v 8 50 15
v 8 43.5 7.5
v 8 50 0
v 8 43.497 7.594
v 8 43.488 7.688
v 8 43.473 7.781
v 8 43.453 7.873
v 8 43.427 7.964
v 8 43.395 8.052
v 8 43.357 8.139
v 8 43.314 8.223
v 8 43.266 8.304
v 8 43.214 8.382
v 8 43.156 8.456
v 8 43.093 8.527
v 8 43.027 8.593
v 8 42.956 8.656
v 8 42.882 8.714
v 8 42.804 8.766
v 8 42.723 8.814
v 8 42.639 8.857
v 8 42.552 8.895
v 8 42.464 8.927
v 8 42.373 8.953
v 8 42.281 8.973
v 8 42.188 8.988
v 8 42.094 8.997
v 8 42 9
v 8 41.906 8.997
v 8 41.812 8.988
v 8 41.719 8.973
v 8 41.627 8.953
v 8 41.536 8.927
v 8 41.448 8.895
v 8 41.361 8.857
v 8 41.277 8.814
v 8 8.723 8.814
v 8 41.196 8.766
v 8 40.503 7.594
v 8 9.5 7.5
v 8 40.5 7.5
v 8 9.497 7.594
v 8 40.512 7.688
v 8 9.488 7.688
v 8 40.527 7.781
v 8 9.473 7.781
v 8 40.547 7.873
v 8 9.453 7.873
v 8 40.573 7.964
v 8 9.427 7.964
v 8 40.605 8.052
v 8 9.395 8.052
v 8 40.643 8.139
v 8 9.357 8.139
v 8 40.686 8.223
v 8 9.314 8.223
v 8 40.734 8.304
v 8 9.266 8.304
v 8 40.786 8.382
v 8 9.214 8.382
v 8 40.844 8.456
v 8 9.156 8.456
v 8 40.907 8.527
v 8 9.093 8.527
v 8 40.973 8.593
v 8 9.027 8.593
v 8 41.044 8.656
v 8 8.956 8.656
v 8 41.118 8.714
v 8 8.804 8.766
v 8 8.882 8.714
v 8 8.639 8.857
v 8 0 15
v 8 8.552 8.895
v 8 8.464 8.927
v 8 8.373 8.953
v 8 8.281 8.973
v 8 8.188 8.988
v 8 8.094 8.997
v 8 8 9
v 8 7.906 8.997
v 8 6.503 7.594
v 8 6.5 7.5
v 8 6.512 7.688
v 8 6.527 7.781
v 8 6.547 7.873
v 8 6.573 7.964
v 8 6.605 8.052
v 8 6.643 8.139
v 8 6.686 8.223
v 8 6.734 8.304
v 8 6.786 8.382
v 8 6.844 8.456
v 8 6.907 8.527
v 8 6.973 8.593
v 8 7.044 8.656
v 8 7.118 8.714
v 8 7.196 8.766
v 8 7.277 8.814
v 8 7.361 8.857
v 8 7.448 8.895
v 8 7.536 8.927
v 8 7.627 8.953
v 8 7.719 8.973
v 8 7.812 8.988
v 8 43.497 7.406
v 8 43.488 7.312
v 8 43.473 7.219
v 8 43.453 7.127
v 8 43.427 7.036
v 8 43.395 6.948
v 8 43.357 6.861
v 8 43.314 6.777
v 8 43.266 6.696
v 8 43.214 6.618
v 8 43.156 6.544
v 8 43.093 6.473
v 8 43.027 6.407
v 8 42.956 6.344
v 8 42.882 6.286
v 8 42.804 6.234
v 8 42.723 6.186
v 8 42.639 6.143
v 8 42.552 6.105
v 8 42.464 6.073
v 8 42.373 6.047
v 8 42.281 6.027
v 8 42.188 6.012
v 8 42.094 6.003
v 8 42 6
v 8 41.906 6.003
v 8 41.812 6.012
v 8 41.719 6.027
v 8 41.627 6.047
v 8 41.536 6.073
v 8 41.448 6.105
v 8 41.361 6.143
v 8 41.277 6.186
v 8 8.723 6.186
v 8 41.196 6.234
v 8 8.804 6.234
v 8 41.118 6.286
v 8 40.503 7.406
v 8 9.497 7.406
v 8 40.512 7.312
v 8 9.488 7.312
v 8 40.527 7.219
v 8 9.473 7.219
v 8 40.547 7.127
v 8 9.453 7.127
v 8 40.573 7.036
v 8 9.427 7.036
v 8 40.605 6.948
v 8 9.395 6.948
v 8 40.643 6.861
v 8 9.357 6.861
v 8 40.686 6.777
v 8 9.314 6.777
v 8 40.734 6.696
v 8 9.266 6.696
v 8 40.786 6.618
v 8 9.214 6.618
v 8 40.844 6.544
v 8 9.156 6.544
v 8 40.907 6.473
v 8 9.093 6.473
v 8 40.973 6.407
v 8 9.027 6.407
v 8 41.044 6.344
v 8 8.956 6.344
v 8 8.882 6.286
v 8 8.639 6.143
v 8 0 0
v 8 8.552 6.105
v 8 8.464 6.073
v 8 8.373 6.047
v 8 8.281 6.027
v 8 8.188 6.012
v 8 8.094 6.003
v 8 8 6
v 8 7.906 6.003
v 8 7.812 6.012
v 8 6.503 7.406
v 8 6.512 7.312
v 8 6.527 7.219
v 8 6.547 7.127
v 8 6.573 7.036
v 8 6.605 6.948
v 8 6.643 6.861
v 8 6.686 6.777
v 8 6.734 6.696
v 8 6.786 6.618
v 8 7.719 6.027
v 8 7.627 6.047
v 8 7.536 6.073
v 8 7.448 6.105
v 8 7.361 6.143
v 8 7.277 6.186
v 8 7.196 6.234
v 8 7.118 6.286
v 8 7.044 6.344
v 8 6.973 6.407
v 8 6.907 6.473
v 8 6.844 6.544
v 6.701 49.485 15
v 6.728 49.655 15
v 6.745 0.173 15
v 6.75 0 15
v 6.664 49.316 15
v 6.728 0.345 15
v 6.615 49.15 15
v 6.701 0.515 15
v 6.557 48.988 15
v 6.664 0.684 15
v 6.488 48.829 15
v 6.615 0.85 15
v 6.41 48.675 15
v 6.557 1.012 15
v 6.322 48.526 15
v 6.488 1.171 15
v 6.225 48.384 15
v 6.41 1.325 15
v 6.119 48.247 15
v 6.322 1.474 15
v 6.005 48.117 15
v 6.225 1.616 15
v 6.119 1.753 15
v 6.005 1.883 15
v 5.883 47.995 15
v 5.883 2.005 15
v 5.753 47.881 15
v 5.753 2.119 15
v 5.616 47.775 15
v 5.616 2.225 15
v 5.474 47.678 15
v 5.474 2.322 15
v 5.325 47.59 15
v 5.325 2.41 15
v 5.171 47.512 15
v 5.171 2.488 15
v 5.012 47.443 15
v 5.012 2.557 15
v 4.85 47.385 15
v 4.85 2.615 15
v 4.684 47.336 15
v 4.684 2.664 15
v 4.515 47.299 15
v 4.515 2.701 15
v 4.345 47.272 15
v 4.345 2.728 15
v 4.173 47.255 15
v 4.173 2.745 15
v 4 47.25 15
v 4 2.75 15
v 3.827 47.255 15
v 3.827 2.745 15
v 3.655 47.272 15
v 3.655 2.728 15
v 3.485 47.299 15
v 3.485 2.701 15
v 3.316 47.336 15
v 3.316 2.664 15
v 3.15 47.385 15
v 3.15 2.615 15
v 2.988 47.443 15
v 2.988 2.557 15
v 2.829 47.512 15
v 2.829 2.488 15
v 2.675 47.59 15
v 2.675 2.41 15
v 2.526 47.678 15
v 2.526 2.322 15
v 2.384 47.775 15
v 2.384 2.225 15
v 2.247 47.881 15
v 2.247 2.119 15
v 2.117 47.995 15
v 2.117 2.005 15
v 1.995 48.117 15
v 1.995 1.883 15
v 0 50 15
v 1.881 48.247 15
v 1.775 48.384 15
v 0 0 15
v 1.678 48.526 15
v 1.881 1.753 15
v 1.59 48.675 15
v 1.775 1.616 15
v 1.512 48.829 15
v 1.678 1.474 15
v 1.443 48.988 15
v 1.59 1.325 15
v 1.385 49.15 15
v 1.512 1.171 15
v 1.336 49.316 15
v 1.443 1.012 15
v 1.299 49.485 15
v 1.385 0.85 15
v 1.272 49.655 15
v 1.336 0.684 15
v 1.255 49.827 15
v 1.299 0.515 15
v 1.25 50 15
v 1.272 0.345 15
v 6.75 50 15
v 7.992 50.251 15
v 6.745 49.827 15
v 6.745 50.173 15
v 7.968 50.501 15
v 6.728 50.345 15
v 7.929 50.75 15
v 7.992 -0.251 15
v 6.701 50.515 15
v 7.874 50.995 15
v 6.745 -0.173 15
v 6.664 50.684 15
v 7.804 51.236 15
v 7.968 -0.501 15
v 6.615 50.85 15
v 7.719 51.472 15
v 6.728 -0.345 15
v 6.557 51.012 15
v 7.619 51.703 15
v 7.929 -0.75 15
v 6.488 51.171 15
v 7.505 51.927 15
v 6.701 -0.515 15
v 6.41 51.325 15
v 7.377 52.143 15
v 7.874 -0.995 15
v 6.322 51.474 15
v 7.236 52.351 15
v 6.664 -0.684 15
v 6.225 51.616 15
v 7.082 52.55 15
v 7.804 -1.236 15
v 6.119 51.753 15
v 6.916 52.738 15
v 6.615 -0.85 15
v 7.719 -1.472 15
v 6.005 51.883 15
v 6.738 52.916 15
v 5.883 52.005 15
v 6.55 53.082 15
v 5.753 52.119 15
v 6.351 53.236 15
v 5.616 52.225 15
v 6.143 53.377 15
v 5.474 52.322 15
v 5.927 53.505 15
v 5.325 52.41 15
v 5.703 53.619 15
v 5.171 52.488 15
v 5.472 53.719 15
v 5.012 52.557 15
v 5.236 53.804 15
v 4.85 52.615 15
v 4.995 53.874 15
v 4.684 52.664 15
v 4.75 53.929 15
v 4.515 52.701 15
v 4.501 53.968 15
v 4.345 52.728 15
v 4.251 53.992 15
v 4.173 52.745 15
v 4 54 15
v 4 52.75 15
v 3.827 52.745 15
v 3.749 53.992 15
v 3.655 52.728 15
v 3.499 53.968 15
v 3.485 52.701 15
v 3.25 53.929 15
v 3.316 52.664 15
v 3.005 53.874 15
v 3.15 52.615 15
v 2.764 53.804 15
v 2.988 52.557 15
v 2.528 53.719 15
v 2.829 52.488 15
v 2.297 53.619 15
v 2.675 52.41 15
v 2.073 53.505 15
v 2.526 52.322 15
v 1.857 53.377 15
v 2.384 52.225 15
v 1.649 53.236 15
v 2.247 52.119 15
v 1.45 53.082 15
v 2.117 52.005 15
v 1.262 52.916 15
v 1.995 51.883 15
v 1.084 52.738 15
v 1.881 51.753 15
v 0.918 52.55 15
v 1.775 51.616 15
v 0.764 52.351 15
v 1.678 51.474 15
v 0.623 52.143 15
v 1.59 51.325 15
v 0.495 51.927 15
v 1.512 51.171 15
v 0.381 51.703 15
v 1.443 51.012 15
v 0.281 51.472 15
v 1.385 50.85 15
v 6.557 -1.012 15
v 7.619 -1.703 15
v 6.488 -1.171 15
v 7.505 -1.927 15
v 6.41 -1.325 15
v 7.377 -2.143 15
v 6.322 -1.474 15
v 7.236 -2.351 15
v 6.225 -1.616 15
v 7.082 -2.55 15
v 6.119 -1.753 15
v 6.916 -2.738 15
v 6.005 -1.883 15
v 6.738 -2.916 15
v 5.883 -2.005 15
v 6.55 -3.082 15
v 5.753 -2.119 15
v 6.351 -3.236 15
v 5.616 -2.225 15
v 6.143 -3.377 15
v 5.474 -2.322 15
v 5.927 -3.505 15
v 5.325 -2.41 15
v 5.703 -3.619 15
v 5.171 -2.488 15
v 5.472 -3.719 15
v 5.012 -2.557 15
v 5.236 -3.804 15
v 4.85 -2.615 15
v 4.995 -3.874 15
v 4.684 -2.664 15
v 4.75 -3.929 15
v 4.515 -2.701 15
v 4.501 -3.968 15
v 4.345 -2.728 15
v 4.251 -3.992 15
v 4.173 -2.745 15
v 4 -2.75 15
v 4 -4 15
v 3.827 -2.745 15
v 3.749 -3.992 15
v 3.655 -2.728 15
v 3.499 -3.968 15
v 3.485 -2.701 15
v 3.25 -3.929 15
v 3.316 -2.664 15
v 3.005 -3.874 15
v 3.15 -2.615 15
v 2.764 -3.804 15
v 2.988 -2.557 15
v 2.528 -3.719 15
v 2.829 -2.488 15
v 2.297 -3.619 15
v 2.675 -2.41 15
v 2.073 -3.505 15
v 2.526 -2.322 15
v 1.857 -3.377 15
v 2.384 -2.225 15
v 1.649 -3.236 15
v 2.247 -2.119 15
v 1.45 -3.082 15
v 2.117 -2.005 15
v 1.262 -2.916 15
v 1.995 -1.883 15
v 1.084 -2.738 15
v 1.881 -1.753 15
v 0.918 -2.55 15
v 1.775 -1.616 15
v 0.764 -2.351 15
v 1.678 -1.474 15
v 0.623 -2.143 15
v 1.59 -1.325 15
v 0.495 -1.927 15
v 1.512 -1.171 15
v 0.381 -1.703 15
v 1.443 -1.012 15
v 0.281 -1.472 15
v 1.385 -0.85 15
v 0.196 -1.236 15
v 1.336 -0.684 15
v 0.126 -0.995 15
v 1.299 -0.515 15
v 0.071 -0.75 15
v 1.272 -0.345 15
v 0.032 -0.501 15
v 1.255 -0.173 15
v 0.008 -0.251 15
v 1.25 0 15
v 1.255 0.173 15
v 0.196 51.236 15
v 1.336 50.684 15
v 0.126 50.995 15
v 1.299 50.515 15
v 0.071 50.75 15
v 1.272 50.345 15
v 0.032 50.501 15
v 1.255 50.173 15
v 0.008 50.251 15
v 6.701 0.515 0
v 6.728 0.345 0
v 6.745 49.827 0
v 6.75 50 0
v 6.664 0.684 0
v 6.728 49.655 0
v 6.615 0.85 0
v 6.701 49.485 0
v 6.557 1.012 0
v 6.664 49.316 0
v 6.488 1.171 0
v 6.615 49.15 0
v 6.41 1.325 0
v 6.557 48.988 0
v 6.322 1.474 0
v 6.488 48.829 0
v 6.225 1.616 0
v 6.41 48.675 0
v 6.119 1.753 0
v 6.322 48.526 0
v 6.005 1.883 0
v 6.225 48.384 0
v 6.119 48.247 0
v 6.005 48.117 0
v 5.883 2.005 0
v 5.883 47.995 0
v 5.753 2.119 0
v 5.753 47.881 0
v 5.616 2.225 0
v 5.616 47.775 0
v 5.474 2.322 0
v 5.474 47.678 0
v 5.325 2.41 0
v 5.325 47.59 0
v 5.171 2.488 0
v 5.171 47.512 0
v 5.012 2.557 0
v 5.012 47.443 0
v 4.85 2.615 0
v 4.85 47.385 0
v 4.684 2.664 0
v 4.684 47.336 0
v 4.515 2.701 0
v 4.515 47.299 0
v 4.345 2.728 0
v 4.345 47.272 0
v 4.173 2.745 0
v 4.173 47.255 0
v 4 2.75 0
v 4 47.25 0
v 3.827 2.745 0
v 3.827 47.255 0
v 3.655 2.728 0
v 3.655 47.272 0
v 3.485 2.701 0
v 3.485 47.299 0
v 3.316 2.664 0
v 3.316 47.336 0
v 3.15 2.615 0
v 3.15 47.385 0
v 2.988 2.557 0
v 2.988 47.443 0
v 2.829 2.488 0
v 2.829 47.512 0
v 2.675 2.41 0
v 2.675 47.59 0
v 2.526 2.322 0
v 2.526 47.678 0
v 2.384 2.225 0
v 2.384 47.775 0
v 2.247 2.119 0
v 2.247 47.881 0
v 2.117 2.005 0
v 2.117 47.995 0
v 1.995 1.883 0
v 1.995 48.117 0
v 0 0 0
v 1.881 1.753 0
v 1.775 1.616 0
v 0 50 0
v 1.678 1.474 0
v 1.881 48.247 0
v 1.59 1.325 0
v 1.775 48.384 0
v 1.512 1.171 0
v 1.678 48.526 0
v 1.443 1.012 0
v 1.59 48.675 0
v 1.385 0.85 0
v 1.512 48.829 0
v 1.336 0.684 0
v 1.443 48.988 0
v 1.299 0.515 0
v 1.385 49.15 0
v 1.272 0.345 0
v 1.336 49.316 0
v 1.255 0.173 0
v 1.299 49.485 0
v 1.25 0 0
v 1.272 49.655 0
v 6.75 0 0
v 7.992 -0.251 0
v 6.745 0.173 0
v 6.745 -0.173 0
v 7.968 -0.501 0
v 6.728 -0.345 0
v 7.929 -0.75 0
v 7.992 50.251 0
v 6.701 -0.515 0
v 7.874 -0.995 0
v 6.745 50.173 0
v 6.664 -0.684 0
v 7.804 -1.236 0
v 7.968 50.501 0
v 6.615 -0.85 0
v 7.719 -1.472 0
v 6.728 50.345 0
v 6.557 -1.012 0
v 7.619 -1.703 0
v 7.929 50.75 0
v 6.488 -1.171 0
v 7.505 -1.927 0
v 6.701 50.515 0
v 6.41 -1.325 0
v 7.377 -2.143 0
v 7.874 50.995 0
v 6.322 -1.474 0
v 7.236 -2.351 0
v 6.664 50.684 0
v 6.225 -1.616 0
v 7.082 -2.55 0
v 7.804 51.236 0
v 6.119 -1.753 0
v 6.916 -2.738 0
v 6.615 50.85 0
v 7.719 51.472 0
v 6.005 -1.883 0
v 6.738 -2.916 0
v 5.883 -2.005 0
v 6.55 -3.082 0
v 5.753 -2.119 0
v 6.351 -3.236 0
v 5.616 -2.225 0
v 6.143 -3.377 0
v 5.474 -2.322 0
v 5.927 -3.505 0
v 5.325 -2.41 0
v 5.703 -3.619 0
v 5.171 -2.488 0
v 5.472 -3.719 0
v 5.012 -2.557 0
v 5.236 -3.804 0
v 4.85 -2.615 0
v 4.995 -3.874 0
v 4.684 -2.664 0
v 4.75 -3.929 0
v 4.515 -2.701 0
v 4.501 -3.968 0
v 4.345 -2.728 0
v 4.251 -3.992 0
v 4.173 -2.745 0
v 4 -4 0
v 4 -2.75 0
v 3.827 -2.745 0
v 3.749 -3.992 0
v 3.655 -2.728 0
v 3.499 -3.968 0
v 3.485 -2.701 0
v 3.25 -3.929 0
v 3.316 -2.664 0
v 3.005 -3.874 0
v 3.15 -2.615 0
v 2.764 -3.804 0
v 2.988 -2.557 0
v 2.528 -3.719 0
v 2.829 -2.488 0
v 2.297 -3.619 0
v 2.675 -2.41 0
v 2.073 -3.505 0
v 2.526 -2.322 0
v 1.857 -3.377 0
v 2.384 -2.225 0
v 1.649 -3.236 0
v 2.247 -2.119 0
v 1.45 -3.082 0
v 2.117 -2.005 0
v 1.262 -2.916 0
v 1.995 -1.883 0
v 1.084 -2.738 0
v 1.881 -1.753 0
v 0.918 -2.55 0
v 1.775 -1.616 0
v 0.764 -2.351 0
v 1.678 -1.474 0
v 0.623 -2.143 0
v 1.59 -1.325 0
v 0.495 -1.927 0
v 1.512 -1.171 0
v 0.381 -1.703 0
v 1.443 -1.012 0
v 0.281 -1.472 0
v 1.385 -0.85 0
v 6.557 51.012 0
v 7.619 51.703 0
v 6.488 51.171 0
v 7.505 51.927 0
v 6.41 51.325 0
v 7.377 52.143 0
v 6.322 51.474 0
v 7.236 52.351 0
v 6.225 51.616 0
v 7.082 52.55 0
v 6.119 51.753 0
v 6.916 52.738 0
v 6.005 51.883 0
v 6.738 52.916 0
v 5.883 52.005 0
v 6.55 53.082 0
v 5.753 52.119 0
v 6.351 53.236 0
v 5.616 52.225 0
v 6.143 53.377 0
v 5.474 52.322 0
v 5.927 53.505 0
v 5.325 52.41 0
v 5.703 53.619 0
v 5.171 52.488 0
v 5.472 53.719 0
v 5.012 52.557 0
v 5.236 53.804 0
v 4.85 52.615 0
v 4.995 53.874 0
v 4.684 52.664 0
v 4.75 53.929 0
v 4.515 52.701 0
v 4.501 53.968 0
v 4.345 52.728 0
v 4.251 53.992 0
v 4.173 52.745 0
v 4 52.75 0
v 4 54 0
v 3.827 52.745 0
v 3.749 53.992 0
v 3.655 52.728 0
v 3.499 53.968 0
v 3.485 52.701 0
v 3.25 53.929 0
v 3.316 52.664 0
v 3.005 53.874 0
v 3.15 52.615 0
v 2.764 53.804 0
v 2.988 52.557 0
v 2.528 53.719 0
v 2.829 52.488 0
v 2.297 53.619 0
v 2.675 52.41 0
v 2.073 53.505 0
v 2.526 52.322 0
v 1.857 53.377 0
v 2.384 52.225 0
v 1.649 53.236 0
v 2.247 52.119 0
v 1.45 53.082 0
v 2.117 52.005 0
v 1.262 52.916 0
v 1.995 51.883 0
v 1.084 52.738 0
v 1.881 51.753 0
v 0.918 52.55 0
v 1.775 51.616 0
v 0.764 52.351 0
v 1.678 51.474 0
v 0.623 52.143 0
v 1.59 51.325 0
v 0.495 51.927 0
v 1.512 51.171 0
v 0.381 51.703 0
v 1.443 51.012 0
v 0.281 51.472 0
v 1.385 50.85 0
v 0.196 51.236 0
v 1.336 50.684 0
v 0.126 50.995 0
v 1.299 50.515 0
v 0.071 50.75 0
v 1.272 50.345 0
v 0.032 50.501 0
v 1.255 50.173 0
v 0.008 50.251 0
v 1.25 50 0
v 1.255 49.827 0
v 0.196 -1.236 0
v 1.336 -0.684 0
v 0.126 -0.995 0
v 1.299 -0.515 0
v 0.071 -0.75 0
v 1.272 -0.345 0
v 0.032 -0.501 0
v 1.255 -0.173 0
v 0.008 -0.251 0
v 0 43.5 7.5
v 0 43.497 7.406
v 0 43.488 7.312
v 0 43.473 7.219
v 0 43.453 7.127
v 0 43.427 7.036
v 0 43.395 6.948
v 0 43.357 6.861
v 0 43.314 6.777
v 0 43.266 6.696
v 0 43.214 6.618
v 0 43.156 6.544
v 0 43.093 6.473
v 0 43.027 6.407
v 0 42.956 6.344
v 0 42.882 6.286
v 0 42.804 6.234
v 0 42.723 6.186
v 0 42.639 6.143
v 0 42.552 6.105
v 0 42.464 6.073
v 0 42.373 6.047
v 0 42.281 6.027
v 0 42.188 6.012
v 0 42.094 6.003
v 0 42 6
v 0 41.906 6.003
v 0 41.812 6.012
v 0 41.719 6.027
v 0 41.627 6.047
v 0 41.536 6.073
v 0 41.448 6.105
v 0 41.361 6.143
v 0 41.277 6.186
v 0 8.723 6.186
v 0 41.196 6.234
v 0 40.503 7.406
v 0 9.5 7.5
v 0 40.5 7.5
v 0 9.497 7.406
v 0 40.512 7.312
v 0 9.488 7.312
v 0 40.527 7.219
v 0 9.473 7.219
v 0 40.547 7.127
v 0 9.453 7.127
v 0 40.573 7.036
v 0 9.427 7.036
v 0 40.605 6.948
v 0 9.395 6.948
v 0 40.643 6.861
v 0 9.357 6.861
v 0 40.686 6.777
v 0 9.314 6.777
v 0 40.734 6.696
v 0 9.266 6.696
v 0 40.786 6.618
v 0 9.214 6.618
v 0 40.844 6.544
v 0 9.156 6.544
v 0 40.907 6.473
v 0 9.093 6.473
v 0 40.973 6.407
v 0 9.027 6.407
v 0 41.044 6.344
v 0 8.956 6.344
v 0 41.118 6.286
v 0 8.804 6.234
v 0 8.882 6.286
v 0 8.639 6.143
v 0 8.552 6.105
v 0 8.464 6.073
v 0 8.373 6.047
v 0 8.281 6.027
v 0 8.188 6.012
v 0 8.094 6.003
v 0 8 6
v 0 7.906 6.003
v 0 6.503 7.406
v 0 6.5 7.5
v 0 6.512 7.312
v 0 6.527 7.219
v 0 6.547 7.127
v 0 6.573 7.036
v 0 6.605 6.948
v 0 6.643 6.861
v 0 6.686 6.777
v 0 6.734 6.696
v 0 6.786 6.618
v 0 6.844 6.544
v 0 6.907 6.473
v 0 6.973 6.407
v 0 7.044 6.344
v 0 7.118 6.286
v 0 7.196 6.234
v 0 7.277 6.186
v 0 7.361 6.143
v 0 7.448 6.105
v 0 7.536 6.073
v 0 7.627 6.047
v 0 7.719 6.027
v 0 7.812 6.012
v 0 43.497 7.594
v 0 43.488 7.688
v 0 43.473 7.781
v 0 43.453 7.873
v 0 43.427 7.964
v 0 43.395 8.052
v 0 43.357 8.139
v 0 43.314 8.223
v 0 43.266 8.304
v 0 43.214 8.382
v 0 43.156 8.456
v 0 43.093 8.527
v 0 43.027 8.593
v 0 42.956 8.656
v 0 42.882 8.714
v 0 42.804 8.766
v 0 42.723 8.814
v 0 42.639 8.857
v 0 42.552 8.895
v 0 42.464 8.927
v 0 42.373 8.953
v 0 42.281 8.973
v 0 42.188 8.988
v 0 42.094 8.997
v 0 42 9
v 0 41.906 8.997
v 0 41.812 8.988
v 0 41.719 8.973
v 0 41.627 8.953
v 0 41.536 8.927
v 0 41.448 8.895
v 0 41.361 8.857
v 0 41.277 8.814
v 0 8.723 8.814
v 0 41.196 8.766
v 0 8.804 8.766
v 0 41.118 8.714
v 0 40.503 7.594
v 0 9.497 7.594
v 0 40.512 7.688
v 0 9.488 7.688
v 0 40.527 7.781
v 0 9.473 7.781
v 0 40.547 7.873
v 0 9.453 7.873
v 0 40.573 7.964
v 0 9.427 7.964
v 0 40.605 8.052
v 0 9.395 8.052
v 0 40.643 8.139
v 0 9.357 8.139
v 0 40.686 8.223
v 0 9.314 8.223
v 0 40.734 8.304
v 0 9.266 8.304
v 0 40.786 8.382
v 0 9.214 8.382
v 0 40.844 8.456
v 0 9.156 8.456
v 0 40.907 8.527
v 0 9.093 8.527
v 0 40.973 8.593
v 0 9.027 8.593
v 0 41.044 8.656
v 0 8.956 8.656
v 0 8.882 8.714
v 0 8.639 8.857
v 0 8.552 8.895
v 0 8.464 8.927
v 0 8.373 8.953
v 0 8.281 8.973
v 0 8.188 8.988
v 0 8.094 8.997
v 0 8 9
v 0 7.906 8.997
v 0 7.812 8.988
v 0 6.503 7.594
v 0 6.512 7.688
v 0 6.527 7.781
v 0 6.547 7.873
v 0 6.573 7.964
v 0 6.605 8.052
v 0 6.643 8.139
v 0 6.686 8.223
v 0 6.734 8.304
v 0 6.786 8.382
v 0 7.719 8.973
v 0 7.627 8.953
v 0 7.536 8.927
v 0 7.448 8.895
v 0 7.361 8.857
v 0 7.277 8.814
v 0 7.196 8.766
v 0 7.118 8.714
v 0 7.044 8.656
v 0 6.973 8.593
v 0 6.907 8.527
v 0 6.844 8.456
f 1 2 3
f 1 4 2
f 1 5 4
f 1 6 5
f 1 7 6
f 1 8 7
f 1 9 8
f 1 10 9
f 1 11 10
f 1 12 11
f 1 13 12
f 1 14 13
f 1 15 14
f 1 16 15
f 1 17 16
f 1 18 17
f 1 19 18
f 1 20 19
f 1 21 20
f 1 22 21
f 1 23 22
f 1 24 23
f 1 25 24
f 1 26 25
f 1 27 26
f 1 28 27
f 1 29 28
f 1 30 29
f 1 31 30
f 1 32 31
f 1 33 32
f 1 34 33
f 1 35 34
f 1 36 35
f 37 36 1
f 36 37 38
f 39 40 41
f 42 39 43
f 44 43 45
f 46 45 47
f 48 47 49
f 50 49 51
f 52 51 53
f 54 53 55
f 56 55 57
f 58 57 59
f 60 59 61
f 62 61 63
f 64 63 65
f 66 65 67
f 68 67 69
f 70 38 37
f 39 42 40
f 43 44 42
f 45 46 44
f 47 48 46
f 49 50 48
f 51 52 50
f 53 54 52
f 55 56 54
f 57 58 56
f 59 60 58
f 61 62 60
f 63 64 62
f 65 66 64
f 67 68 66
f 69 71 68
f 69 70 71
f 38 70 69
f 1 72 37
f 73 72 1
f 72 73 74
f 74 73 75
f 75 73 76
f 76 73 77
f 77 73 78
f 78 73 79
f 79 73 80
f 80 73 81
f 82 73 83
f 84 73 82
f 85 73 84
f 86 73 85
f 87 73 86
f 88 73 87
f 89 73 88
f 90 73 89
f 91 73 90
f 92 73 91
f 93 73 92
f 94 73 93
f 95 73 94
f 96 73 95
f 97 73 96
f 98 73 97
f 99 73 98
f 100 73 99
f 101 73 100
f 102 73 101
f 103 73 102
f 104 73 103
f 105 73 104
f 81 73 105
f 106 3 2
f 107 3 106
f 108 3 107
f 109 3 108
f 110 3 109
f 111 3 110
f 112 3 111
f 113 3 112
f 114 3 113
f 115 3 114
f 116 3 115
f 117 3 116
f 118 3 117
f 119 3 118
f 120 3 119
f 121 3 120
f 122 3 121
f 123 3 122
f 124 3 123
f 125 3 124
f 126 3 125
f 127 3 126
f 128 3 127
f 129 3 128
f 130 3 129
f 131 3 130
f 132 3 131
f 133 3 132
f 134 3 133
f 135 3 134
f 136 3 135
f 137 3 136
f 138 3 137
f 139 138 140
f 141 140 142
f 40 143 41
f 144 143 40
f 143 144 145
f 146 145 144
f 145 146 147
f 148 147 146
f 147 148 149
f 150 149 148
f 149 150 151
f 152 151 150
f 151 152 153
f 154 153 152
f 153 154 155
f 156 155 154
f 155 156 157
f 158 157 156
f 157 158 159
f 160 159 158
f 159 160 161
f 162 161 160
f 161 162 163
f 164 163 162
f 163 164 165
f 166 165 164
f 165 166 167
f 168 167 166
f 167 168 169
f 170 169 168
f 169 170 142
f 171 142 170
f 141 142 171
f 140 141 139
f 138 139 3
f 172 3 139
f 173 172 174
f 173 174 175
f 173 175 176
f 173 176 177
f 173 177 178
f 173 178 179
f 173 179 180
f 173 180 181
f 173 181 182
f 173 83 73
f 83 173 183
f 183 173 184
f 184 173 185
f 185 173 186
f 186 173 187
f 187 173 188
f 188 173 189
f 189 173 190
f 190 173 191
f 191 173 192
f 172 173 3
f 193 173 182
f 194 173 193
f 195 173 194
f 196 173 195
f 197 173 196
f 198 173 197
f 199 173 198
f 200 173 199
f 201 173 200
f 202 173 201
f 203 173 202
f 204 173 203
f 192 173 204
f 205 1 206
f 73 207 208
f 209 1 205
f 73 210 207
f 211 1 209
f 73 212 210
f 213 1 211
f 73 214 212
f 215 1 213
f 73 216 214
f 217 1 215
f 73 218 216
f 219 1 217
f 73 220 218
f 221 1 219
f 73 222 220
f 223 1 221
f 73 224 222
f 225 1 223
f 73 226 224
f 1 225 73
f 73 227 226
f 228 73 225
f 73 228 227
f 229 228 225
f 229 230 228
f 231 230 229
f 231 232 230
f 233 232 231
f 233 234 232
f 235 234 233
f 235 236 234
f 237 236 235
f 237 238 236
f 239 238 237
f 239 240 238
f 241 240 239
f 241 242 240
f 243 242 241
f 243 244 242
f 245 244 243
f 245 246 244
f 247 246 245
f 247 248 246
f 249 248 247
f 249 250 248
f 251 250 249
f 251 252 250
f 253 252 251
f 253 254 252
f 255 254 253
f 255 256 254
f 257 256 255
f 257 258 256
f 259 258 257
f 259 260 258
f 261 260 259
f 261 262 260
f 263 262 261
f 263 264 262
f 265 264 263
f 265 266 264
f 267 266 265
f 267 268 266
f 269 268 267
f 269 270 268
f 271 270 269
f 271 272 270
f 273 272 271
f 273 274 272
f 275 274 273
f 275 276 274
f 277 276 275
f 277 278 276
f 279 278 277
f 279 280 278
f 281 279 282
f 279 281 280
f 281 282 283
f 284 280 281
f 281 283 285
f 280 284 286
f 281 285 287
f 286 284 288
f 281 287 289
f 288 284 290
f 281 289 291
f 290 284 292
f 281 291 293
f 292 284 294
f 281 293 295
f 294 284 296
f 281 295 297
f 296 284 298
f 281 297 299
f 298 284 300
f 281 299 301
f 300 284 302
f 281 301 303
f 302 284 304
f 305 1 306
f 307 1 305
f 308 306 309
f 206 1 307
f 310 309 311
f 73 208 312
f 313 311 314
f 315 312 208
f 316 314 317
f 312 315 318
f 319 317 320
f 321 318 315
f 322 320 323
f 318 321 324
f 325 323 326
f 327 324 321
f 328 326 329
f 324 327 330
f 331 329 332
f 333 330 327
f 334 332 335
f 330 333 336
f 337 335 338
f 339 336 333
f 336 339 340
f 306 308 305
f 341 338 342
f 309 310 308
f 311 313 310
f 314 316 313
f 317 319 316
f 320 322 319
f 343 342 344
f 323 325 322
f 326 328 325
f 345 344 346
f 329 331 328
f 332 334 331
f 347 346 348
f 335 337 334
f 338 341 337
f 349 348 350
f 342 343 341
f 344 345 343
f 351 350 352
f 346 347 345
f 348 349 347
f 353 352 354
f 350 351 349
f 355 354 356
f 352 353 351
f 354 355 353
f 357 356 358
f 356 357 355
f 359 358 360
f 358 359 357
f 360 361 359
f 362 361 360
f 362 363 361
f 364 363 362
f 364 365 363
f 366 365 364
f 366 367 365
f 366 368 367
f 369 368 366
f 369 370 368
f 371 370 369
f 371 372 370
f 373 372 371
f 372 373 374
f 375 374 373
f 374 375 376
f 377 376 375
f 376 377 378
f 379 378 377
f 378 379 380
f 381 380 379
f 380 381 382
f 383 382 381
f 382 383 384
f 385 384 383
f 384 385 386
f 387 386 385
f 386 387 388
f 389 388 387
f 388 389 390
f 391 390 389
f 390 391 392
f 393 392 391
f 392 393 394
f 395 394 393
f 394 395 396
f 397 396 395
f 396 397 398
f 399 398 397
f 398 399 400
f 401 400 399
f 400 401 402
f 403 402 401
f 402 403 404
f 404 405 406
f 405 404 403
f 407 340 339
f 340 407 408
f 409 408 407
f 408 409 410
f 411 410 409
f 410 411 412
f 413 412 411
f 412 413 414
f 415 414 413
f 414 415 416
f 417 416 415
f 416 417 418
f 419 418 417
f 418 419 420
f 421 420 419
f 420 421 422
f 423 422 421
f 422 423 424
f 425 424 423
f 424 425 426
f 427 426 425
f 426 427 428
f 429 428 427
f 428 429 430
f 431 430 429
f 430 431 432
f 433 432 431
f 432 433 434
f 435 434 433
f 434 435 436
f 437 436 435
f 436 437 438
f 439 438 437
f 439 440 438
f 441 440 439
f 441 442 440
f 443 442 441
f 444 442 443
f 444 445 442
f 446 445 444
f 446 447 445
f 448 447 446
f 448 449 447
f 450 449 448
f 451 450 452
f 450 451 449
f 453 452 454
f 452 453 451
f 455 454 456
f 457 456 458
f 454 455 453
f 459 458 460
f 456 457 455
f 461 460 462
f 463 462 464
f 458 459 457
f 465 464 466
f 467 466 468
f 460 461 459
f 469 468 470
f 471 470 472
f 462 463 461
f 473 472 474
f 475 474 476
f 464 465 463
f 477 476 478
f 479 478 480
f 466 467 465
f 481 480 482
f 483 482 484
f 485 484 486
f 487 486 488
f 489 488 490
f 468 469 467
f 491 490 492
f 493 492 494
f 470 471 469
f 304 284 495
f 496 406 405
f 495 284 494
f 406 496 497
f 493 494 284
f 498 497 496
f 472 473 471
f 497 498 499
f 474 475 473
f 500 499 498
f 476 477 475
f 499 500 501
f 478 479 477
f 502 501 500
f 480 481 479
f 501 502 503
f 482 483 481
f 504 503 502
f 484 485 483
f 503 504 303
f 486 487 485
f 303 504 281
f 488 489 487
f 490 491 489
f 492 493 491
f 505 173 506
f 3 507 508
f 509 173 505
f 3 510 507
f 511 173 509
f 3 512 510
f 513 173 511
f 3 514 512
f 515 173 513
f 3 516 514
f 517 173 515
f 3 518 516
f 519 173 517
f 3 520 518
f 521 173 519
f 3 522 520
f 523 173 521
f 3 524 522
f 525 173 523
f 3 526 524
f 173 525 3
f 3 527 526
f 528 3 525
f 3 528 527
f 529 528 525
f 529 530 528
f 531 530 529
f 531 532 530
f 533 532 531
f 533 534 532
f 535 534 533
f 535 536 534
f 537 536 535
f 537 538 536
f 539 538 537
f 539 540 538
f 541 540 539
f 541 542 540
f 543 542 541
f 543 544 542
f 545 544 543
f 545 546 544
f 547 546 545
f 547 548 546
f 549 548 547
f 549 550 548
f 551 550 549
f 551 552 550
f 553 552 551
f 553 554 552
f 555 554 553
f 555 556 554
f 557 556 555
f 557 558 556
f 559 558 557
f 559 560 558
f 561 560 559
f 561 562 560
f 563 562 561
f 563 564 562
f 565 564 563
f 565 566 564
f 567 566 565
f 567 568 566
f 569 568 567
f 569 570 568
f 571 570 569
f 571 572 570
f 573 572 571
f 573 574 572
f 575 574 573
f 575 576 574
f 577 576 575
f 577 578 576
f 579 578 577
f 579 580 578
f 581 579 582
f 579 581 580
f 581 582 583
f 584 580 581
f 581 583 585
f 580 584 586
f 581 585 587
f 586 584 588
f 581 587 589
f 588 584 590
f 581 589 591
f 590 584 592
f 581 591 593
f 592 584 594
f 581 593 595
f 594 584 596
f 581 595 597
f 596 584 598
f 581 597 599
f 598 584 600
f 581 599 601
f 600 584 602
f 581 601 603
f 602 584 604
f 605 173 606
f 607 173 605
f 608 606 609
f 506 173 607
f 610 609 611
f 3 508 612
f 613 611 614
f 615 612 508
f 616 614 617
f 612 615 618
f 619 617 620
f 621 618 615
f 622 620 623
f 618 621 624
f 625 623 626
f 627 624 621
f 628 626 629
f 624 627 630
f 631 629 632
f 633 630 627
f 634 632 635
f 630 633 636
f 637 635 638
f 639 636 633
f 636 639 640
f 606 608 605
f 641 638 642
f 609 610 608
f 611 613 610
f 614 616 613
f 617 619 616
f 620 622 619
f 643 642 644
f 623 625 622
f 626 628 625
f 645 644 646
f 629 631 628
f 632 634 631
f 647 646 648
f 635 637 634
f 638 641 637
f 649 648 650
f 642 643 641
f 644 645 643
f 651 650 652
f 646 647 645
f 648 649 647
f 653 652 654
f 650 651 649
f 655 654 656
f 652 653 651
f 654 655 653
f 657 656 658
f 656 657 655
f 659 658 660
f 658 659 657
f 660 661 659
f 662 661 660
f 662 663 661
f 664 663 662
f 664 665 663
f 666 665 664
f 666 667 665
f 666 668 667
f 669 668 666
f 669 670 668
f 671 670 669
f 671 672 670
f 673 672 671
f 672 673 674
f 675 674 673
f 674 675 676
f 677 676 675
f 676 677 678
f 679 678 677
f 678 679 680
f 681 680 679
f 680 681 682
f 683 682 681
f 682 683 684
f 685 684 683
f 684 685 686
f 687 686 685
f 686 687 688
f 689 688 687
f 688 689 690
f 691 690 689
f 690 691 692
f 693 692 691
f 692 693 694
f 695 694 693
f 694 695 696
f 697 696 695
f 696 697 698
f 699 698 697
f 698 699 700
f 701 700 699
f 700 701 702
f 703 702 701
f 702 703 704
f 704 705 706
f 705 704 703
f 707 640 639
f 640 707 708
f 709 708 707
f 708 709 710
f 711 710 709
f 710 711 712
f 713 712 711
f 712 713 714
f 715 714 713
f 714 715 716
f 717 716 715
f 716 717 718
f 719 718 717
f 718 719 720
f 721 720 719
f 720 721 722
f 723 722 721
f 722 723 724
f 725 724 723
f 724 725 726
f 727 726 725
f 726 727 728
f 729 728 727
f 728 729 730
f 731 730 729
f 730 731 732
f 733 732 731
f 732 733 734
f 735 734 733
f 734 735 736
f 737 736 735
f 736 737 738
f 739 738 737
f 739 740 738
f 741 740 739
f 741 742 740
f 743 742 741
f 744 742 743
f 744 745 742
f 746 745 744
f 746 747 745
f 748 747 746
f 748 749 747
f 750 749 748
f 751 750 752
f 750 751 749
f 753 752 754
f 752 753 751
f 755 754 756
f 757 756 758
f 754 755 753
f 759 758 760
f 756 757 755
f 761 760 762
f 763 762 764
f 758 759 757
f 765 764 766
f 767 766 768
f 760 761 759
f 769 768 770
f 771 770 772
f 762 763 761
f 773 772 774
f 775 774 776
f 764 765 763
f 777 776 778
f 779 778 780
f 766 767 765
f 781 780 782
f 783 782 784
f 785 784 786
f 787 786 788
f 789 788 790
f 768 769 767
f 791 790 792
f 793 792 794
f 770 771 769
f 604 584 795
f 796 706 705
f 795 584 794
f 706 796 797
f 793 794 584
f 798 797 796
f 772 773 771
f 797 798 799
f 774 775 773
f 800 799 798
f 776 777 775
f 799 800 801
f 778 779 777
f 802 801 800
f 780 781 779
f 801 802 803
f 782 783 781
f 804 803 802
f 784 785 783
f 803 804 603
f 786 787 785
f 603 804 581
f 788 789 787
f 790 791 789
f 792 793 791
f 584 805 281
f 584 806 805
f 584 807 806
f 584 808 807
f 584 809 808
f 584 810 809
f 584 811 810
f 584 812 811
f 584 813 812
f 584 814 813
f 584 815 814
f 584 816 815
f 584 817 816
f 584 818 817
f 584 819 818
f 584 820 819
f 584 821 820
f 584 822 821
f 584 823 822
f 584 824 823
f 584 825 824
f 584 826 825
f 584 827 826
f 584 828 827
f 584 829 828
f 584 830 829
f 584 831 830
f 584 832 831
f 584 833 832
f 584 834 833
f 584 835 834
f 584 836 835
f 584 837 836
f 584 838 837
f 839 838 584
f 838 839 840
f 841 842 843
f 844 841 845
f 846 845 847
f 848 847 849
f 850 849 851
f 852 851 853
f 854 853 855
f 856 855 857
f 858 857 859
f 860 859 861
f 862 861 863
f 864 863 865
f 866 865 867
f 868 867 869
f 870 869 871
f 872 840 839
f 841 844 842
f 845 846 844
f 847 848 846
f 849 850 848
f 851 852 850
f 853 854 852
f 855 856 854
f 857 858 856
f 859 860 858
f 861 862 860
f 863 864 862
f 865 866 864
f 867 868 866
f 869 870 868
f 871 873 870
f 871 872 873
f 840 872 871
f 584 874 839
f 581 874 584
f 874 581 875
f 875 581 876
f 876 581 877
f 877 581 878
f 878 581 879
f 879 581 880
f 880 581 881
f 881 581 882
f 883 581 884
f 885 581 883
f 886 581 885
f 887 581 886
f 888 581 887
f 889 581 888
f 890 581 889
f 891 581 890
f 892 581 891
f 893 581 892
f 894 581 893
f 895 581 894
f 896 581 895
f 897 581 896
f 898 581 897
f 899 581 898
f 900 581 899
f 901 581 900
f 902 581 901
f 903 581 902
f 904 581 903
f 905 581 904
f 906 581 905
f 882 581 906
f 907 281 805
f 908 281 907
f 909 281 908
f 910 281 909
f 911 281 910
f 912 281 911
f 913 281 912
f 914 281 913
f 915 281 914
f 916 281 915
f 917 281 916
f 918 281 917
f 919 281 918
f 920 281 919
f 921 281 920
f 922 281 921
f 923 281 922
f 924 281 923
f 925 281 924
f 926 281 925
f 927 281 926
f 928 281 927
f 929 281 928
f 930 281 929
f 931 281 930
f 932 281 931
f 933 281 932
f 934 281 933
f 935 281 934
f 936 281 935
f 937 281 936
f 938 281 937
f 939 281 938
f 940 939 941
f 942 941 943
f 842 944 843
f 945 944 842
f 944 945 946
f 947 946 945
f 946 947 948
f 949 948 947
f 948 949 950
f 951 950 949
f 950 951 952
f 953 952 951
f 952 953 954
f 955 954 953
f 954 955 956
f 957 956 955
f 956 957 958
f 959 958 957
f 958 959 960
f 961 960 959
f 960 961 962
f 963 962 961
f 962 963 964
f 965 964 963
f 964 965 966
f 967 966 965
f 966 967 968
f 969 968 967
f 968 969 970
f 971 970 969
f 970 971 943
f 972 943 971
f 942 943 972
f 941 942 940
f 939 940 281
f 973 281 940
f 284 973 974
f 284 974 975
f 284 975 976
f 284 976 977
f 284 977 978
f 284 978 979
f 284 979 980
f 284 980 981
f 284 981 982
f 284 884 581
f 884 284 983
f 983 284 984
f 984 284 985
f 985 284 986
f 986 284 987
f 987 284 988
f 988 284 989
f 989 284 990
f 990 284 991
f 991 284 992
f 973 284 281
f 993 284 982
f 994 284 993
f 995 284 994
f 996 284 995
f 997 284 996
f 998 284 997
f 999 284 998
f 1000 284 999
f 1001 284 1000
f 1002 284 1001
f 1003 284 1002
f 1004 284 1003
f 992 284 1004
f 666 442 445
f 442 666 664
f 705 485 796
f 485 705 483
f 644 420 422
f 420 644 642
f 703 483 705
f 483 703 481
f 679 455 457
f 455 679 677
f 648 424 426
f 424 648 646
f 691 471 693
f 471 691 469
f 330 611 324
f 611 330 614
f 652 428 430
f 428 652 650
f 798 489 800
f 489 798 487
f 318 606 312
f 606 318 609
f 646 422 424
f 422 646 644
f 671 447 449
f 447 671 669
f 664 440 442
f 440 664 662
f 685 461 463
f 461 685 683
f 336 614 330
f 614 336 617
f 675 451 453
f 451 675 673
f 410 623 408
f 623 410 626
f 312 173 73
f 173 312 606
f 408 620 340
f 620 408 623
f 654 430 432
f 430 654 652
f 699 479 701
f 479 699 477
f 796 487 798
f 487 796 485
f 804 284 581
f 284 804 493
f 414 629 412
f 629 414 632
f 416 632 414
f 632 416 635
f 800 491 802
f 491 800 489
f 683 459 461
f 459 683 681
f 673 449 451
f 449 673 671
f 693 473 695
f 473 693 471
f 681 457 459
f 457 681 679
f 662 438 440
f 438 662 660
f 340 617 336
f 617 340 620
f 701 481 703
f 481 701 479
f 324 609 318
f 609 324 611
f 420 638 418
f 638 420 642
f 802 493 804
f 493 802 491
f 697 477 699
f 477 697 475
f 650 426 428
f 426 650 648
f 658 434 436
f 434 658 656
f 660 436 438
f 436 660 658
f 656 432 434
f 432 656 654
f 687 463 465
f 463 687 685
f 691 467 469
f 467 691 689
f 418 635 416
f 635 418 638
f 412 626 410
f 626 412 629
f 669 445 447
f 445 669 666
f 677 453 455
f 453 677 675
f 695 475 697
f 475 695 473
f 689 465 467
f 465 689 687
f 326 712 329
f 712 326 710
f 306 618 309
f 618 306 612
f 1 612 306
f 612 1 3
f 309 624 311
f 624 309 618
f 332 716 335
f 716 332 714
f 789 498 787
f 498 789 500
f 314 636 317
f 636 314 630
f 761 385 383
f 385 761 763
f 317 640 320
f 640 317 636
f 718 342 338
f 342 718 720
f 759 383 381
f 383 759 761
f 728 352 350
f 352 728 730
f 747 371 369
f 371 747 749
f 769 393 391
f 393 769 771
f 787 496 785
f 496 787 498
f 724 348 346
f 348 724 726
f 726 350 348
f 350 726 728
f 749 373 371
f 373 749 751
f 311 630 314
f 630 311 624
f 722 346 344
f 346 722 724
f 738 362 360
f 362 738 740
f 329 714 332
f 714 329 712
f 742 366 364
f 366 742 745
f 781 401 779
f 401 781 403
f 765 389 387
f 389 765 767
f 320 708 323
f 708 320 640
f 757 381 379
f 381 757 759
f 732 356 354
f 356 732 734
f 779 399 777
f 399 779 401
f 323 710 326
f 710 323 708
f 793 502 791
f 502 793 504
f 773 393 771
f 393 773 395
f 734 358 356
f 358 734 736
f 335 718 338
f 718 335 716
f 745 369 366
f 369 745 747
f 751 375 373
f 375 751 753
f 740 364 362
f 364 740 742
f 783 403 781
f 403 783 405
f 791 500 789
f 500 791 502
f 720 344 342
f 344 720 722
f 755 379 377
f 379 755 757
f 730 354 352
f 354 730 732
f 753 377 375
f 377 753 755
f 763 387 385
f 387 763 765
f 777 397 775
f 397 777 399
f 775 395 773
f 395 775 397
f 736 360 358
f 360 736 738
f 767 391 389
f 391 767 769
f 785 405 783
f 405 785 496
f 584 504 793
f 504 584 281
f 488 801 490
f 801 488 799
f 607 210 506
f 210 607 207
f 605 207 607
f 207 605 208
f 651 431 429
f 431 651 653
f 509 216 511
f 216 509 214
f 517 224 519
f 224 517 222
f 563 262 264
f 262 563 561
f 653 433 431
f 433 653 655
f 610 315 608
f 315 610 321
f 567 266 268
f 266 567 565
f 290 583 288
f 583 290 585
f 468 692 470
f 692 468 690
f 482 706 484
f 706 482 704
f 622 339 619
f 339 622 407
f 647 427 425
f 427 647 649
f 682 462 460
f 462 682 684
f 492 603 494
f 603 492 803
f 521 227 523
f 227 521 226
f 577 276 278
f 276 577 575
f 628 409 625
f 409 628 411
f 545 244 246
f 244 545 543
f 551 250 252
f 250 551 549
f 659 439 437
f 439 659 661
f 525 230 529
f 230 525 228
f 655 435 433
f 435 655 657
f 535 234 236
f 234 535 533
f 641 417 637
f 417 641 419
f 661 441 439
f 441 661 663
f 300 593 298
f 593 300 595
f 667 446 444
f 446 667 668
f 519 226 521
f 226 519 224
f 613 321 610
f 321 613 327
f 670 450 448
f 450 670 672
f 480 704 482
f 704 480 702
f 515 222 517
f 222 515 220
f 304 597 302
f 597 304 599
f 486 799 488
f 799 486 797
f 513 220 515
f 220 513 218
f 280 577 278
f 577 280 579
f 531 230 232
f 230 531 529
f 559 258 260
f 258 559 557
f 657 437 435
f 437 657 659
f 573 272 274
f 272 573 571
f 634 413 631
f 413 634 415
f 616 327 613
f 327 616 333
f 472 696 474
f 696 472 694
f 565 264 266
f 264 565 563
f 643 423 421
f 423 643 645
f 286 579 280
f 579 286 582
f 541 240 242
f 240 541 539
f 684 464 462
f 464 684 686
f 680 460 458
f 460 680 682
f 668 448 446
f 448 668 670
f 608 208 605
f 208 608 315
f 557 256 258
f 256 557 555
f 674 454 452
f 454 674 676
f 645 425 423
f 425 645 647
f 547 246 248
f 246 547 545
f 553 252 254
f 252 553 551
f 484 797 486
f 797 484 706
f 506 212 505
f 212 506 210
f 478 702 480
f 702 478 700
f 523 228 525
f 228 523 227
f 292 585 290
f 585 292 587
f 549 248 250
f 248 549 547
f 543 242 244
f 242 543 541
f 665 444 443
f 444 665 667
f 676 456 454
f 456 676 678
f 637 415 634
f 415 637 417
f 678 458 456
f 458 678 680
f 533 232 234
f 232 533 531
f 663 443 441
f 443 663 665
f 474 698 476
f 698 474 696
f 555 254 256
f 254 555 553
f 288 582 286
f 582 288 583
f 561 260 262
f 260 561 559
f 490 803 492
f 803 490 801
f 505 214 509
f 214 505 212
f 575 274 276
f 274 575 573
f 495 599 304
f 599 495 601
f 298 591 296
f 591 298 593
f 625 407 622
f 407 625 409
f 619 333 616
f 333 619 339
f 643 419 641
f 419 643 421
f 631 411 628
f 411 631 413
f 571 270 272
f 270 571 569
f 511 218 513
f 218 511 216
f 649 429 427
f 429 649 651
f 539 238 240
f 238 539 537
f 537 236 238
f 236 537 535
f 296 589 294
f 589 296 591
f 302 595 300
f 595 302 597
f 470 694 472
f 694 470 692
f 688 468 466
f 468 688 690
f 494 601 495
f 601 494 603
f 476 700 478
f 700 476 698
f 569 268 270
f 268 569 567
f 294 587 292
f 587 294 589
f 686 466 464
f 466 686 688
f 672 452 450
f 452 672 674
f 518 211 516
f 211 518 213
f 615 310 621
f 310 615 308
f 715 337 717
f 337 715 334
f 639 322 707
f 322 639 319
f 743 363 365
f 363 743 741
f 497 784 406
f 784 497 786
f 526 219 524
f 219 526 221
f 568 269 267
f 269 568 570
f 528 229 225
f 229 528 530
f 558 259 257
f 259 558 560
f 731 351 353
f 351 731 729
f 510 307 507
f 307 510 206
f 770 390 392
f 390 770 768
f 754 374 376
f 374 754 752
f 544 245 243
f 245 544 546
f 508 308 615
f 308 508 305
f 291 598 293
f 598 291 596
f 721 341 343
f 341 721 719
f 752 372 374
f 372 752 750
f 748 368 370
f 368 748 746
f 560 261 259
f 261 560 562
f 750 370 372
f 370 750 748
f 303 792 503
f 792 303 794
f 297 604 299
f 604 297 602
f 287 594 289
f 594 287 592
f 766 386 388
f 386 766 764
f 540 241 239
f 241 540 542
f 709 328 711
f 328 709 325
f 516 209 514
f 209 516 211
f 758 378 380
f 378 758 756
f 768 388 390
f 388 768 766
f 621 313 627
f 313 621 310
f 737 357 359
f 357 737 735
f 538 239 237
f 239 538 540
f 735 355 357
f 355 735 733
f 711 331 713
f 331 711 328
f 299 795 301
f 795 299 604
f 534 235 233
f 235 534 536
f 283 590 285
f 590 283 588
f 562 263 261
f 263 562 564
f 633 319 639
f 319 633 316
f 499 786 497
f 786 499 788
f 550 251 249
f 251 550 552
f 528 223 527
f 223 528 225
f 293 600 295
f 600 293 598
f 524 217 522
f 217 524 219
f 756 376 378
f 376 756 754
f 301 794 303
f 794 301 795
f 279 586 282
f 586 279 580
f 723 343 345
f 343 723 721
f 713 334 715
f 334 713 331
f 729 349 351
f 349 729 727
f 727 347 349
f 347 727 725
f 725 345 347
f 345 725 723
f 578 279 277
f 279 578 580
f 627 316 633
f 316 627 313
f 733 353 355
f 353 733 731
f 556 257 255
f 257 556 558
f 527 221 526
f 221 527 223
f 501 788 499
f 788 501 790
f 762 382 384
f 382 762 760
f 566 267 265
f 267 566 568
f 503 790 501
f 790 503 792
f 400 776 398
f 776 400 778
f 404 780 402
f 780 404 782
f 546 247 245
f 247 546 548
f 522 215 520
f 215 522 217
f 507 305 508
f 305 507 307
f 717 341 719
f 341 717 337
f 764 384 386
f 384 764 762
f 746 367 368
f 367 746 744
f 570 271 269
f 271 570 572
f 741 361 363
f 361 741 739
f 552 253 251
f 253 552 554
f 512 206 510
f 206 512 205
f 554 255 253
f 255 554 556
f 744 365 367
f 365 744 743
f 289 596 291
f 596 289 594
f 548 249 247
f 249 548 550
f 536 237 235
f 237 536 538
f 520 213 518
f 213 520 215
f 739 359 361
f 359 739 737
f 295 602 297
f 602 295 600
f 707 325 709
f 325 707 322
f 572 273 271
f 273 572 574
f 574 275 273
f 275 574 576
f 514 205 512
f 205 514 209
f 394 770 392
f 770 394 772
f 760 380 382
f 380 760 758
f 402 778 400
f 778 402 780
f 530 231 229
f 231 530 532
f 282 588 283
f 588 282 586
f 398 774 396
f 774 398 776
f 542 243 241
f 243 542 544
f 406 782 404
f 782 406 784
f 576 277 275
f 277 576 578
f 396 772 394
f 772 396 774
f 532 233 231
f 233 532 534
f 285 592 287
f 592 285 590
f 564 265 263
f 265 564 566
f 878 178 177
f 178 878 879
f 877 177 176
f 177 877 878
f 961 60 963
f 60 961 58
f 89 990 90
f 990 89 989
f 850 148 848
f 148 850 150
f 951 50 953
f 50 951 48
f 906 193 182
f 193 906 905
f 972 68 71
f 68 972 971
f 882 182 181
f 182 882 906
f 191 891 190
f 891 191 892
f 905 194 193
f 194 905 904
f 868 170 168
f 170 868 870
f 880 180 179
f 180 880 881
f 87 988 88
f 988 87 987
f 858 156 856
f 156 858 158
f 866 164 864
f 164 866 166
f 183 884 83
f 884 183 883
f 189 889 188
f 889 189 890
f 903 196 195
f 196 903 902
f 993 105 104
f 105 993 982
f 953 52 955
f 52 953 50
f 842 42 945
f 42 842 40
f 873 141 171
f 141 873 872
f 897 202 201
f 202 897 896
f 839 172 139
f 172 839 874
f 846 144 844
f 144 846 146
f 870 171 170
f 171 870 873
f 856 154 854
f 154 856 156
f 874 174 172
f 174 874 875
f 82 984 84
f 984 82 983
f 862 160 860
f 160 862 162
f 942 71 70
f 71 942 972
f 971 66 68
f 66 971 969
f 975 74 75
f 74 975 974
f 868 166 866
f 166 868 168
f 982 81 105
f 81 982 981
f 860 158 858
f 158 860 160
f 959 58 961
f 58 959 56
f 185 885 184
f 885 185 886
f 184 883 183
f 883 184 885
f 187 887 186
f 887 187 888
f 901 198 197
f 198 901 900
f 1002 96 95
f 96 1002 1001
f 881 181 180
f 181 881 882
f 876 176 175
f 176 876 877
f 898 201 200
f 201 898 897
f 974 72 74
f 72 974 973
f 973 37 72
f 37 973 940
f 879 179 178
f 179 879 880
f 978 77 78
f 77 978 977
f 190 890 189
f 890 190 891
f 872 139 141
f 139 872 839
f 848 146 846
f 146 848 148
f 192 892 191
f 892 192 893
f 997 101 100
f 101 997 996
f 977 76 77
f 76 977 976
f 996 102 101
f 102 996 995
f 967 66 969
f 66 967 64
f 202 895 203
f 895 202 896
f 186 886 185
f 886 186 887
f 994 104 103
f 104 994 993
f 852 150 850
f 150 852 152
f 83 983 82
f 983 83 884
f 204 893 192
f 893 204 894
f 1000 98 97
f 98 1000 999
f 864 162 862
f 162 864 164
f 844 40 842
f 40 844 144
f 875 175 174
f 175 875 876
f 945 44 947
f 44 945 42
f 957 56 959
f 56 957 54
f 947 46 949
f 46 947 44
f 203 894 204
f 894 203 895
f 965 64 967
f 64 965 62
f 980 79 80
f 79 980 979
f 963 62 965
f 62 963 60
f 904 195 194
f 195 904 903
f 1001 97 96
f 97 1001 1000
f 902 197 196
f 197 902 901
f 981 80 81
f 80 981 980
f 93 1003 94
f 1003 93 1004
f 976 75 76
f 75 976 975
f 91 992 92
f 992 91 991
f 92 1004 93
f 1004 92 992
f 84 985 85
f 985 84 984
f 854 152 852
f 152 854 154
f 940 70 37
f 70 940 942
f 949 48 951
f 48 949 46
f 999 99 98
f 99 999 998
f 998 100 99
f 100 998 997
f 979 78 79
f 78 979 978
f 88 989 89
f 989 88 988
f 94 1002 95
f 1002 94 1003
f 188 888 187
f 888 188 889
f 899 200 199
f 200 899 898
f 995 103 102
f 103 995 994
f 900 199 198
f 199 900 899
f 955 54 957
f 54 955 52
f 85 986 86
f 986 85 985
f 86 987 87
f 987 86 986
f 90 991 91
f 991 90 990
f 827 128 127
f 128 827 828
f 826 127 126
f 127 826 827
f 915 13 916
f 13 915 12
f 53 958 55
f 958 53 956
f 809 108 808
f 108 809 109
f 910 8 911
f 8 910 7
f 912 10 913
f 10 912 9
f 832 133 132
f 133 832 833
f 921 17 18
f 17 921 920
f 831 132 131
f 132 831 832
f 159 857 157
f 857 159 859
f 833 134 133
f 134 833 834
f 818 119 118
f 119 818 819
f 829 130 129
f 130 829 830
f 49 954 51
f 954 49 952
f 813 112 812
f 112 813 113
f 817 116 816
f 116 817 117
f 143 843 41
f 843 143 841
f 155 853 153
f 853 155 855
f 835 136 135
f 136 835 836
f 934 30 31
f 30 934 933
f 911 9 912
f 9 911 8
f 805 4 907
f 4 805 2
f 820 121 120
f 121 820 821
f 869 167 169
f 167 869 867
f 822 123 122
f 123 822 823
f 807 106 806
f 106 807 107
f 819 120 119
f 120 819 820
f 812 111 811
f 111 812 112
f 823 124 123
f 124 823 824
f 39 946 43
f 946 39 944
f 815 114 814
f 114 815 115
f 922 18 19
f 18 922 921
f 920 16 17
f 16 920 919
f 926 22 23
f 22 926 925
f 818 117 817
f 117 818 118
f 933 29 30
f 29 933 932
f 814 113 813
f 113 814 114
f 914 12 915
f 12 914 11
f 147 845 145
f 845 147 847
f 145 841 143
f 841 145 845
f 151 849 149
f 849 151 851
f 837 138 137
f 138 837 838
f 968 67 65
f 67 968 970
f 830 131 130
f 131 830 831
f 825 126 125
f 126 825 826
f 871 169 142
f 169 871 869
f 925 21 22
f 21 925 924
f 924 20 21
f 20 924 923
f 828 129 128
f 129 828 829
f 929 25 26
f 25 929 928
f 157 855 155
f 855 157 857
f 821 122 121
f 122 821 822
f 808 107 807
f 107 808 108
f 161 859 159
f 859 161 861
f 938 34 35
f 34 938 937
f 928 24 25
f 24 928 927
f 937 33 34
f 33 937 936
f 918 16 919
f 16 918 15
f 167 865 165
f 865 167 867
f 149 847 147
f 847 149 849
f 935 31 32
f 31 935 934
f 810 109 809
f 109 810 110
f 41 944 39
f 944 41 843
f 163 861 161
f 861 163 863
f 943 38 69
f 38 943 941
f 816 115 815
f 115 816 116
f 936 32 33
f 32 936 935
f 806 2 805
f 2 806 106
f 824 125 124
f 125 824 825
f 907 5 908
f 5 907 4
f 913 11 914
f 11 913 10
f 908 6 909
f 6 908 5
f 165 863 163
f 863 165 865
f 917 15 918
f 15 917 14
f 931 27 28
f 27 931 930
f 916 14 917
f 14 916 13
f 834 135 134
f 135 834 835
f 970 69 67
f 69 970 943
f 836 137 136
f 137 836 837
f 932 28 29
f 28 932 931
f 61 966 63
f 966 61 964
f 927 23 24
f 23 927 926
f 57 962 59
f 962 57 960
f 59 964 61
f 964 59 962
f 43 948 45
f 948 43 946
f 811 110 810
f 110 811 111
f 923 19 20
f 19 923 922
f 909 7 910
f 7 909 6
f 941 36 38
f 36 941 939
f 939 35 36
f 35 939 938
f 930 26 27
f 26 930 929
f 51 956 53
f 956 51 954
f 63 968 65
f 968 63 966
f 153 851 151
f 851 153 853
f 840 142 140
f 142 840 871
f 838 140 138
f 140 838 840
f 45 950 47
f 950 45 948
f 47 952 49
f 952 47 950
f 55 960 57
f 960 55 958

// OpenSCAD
/*

Description: those spacers are used to assemble my rocket payload altimeters plate. You will need a minimum of 2 of those
Author: Boris du Reau
Date: 24/08/2018
Lenght between rod holes: 50mm
*/
$fn=100; 
// diameter of the holes used to screw the altimeter plate
plate_hole_diam= 3;
spacer_width = 15;
spacer_rod_diam = 5.5;
//lenght betwen the rod hols
spacer_length= 50;
spacer_height=8;

// main spacer
module spacer() {
cube ([spacer_height,spacer_length,spacer_width ]);
translate ([spacer_height/2, 0,0]) cylinder (h=spacer_width, r=spacer_height/2);
translate ([spacer_height/2, spacer_length,0]) cylinder (h=spacer_width, r=spacer_height/2);
}

difference () {
    spacer();
    // rod holes
    translate ([spacer_height/2, 0,0])cylinder(h=spacer_width, r=spacer_rod_diam/2);
    translate ([spacer_height/2, spacer_length,0])cylinder(h=spacer_width, r=spacer_rod_diam/2);
    //holes to screw the altimeters plate
    rotate ([0,90,0]) translate ([-spacer_width/2,spacer_height,0])cylinder(h=spacer_width, r=plate_hole_diam/2);
    rotate ([0,90,0]) translate ([-spacer_width/2,spacer_length-spacer_height,0])cylinder(h=spacer_width, r=plate_hole_diam/2);  
}
